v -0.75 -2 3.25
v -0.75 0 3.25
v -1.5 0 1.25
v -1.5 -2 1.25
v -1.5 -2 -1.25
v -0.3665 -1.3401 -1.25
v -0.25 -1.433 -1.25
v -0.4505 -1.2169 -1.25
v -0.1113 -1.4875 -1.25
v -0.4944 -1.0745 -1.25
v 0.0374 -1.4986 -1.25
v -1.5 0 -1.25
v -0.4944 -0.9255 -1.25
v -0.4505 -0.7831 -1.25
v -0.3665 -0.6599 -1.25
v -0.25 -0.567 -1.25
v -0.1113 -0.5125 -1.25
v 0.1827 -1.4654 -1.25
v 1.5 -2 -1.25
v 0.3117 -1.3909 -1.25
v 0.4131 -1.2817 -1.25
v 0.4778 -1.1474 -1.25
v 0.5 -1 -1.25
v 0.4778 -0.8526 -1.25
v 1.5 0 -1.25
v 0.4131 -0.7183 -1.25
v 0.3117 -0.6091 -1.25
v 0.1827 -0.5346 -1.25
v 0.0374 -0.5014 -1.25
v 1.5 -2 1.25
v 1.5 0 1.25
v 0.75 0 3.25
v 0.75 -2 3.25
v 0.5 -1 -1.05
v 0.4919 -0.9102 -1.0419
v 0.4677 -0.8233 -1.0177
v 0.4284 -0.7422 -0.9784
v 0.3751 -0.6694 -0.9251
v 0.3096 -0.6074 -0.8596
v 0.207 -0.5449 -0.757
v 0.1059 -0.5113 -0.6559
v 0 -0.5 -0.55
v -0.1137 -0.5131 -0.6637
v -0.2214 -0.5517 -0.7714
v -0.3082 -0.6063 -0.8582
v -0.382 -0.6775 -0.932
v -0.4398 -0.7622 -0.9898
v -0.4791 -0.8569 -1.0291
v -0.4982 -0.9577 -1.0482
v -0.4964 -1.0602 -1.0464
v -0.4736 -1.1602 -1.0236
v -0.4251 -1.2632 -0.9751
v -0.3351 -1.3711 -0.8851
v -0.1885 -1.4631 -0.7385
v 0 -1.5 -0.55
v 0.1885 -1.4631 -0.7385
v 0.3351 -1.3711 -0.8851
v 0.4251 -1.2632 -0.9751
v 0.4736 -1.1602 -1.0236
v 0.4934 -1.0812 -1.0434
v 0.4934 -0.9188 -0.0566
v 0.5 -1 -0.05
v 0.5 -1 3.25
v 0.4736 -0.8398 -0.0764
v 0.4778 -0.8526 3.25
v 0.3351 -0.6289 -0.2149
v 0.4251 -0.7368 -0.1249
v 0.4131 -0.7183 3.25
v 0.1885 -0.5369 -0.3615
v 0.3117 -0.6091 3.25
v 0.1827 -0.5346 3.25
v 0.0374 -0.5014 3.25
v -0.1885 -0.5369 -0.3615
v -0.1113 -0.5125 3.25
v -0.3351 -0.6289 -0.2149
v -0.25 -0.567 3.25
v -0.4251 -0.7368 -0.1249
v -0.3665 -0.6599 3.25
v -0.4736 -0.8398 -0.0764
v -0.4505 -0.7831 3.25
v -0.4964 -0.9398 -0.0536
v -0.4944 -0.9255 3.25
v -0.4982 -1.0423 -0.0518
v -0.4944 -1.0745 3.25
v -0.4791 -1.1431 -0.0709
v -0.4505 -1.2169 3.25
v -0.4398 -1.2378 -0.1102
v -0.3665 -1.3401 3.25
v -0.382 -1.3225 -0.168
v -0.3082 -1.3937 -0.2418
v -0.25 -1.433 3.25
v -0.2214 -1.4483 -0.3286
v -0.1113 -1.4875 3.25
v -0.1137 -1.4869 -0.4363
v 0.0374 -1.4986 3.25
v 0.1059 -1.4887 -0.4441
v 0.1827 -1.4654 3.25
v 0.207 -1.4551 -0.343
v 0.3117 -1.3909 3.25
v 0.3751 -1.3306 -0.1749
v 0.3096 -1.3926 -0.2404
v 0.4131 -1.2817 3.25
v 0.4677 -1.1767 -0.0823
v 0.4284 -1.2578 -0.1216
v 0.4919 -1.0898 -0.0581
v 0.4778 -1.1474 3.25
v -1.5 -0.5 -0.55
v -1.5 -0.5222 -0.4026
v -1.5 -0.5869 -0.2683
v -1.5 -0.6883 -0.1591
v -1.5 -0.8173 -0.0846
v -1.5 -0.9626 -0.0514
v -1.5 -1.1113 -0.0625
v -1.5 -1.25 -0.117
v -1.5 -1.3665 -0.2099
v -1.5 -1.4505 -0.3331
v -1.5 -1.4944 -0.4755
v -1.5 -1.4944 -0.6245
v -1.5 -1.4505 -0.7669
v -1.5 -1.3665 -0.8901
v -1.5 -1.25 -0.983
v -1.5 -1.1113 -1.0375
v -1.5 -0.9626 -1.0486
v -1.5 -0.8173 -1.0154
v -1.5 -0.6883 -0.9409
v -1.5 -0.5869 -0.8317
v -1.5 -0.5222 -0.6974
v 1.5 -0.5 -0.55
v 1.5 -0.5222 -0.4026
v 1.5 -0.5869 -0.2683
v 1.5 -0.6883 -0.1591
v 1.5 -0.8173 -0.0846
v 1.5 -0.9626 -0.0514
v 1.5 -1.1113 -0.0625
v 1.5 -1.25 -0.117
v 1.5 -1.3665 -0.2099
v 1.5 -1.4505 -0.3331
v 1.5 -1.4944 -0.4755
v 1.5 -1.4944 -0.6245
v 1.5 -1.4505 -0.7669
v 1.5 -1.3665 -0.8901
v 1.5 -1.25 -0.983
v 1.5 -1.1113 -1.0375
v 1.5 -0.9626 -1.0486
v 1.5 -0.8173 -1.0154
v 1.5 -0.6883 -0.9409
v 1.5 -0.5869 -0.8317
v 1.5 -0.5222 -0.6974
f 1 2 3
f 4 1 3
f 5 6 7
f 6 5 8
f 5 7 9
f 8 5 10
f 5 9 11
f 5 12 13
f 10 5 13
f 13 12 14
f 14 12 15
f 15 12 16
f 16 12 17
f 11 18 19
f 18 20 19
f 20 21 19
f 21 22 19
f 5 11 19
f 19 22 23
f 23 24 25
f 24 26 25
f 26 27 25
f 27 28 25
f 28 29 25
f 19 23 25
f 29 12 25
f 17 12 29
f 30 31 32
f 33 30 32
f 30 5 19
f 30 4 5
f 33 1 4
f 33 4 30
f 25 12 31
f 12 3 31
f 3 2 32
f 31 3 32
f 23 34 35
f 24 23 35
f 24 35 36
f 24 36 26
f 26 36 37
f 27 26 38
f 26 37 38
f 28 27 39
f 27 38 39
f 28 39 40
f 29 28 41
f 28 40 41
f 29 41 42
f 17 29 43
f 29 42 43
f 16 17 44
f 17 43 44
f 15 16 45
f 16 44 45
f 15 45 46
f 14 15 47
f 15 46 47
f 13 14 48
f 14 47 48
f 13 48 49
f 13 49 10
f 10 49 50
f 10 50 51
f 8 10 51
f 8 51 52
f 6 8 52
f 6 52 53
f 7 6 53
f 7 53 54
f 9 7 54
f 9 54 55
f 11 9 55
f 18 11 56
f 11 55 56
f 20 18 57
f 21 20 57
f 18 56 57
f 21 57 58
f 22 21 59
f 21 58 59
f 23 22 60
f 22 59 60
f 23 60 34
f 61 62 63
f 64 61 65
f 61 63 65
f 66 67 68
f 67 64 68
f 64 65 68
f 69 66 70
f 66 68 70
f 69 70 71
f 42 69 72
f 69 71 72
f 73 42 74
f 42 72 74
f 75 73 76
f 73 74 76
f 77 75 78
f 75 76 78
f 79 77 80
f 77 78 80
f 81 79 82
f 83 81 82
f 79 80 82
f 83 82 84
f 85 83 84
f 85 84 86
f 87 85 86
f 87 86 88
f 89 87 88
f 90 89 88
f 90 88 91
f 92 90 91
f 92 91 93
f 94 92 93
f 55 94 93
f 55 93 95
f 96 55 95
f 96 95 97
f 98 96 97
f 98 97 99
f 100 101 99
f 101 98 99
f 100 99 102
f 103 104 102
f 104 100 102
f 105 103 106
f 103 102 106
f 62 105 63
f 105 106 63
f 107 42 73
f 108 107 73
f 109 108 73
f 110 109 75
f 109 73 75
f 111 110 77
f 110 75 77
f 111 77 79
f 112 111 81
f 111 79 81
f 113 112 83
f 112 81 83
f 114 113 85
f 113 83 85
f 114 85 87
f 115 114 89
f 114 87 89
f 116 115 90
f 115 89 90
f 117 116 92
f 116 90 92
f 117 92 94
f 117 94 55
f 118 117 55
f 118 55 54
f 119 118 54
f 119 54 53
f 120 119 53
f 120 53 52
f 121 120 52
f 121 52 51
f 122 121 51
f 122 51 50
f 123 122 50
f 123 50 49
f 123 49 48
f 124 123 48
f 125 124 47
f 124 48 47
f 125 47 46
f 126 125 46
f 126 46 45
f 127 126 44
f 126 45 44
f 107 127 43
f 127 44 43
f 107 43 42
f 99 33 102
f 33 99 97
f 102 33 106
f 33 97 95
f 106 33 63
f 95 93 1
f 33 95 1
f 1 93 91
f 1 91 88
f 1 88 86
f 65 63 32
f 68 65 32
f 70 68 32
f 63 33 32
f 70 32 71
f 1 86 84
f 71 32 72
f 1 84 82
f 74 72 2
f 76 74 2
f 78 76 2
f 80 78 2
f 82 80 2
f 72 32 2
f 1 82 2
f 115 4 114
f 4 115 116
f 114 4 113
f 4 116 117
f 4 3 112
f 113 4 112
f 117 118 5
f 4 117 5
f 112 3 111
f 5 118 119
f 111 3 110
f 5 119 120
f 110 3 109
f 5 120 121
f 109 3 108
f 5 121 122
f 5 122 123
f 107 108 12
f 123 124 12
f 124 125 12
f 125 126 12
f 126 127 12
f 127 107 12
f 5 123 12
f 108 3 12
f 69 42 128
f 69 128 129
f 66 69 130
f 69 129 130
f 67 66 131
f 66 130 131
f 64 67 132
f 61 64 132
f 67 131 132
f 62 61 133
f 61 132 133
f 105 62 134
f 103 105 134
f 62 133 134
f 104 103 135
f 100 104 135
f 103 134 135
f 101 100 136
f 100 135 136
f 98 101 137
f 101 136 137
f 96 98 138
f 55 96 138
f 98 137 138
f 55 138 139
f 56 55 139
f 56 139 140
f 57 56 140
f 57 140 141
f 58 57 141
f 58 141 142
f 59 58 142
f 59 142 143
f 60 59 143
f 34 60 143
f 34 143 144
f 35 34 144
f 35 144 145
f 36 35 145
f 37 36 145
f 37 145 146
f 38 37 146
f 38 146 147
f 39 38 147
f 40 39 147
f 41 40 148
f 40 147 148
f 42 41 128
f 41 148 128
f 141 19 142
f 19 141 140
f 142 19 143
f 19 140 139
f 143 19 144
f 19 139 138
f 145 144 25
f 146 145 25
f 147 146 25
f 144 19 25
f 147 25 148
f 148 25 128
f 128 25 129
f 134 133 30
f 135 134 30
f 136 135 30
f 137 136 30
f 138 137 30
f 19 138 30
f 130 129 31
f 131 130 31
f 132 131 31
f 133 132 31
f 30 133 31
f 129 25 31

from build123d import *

# Parameters (mm, degrees)
F1_DEPTH = 2
F2_R     = 0.5
F3_DEPTH = 25
F4_R     = 0.5
F5_DEPTH = 25


with BuildPart() as f1:
    # F0 (on Front) → F1 (new body)
    with BuildSketch(Plane.XZ):
        Polygon((-1.5, -1.25), (1.5, -1.25), (1.5, 1.25), (0.75, 3.25), (-0.75, 3.25), (-1.5, 1.25), align=None)
    extrude(amount=F1_DEPTH)

    # F2 (on face) → F3 (cut)
    with BuildSketch(Plane.YZ.offset(1.5)):
        with Locations((-1, -0.55)):
            Circle(F2_R)
    extrude(amount=-F3_DEPTH, mode=Mode.SUBTRACT)

    # F4 (on face) → F5 (cut)
    with BuildSketch(Plane.XY.offset(3.25)):
        with Locations((0, -1)):
            Circle(F4_R)
    extrude(amount=-F5_DEPTH, mode=Mode.SUBTRACT)


solid = f1.part
